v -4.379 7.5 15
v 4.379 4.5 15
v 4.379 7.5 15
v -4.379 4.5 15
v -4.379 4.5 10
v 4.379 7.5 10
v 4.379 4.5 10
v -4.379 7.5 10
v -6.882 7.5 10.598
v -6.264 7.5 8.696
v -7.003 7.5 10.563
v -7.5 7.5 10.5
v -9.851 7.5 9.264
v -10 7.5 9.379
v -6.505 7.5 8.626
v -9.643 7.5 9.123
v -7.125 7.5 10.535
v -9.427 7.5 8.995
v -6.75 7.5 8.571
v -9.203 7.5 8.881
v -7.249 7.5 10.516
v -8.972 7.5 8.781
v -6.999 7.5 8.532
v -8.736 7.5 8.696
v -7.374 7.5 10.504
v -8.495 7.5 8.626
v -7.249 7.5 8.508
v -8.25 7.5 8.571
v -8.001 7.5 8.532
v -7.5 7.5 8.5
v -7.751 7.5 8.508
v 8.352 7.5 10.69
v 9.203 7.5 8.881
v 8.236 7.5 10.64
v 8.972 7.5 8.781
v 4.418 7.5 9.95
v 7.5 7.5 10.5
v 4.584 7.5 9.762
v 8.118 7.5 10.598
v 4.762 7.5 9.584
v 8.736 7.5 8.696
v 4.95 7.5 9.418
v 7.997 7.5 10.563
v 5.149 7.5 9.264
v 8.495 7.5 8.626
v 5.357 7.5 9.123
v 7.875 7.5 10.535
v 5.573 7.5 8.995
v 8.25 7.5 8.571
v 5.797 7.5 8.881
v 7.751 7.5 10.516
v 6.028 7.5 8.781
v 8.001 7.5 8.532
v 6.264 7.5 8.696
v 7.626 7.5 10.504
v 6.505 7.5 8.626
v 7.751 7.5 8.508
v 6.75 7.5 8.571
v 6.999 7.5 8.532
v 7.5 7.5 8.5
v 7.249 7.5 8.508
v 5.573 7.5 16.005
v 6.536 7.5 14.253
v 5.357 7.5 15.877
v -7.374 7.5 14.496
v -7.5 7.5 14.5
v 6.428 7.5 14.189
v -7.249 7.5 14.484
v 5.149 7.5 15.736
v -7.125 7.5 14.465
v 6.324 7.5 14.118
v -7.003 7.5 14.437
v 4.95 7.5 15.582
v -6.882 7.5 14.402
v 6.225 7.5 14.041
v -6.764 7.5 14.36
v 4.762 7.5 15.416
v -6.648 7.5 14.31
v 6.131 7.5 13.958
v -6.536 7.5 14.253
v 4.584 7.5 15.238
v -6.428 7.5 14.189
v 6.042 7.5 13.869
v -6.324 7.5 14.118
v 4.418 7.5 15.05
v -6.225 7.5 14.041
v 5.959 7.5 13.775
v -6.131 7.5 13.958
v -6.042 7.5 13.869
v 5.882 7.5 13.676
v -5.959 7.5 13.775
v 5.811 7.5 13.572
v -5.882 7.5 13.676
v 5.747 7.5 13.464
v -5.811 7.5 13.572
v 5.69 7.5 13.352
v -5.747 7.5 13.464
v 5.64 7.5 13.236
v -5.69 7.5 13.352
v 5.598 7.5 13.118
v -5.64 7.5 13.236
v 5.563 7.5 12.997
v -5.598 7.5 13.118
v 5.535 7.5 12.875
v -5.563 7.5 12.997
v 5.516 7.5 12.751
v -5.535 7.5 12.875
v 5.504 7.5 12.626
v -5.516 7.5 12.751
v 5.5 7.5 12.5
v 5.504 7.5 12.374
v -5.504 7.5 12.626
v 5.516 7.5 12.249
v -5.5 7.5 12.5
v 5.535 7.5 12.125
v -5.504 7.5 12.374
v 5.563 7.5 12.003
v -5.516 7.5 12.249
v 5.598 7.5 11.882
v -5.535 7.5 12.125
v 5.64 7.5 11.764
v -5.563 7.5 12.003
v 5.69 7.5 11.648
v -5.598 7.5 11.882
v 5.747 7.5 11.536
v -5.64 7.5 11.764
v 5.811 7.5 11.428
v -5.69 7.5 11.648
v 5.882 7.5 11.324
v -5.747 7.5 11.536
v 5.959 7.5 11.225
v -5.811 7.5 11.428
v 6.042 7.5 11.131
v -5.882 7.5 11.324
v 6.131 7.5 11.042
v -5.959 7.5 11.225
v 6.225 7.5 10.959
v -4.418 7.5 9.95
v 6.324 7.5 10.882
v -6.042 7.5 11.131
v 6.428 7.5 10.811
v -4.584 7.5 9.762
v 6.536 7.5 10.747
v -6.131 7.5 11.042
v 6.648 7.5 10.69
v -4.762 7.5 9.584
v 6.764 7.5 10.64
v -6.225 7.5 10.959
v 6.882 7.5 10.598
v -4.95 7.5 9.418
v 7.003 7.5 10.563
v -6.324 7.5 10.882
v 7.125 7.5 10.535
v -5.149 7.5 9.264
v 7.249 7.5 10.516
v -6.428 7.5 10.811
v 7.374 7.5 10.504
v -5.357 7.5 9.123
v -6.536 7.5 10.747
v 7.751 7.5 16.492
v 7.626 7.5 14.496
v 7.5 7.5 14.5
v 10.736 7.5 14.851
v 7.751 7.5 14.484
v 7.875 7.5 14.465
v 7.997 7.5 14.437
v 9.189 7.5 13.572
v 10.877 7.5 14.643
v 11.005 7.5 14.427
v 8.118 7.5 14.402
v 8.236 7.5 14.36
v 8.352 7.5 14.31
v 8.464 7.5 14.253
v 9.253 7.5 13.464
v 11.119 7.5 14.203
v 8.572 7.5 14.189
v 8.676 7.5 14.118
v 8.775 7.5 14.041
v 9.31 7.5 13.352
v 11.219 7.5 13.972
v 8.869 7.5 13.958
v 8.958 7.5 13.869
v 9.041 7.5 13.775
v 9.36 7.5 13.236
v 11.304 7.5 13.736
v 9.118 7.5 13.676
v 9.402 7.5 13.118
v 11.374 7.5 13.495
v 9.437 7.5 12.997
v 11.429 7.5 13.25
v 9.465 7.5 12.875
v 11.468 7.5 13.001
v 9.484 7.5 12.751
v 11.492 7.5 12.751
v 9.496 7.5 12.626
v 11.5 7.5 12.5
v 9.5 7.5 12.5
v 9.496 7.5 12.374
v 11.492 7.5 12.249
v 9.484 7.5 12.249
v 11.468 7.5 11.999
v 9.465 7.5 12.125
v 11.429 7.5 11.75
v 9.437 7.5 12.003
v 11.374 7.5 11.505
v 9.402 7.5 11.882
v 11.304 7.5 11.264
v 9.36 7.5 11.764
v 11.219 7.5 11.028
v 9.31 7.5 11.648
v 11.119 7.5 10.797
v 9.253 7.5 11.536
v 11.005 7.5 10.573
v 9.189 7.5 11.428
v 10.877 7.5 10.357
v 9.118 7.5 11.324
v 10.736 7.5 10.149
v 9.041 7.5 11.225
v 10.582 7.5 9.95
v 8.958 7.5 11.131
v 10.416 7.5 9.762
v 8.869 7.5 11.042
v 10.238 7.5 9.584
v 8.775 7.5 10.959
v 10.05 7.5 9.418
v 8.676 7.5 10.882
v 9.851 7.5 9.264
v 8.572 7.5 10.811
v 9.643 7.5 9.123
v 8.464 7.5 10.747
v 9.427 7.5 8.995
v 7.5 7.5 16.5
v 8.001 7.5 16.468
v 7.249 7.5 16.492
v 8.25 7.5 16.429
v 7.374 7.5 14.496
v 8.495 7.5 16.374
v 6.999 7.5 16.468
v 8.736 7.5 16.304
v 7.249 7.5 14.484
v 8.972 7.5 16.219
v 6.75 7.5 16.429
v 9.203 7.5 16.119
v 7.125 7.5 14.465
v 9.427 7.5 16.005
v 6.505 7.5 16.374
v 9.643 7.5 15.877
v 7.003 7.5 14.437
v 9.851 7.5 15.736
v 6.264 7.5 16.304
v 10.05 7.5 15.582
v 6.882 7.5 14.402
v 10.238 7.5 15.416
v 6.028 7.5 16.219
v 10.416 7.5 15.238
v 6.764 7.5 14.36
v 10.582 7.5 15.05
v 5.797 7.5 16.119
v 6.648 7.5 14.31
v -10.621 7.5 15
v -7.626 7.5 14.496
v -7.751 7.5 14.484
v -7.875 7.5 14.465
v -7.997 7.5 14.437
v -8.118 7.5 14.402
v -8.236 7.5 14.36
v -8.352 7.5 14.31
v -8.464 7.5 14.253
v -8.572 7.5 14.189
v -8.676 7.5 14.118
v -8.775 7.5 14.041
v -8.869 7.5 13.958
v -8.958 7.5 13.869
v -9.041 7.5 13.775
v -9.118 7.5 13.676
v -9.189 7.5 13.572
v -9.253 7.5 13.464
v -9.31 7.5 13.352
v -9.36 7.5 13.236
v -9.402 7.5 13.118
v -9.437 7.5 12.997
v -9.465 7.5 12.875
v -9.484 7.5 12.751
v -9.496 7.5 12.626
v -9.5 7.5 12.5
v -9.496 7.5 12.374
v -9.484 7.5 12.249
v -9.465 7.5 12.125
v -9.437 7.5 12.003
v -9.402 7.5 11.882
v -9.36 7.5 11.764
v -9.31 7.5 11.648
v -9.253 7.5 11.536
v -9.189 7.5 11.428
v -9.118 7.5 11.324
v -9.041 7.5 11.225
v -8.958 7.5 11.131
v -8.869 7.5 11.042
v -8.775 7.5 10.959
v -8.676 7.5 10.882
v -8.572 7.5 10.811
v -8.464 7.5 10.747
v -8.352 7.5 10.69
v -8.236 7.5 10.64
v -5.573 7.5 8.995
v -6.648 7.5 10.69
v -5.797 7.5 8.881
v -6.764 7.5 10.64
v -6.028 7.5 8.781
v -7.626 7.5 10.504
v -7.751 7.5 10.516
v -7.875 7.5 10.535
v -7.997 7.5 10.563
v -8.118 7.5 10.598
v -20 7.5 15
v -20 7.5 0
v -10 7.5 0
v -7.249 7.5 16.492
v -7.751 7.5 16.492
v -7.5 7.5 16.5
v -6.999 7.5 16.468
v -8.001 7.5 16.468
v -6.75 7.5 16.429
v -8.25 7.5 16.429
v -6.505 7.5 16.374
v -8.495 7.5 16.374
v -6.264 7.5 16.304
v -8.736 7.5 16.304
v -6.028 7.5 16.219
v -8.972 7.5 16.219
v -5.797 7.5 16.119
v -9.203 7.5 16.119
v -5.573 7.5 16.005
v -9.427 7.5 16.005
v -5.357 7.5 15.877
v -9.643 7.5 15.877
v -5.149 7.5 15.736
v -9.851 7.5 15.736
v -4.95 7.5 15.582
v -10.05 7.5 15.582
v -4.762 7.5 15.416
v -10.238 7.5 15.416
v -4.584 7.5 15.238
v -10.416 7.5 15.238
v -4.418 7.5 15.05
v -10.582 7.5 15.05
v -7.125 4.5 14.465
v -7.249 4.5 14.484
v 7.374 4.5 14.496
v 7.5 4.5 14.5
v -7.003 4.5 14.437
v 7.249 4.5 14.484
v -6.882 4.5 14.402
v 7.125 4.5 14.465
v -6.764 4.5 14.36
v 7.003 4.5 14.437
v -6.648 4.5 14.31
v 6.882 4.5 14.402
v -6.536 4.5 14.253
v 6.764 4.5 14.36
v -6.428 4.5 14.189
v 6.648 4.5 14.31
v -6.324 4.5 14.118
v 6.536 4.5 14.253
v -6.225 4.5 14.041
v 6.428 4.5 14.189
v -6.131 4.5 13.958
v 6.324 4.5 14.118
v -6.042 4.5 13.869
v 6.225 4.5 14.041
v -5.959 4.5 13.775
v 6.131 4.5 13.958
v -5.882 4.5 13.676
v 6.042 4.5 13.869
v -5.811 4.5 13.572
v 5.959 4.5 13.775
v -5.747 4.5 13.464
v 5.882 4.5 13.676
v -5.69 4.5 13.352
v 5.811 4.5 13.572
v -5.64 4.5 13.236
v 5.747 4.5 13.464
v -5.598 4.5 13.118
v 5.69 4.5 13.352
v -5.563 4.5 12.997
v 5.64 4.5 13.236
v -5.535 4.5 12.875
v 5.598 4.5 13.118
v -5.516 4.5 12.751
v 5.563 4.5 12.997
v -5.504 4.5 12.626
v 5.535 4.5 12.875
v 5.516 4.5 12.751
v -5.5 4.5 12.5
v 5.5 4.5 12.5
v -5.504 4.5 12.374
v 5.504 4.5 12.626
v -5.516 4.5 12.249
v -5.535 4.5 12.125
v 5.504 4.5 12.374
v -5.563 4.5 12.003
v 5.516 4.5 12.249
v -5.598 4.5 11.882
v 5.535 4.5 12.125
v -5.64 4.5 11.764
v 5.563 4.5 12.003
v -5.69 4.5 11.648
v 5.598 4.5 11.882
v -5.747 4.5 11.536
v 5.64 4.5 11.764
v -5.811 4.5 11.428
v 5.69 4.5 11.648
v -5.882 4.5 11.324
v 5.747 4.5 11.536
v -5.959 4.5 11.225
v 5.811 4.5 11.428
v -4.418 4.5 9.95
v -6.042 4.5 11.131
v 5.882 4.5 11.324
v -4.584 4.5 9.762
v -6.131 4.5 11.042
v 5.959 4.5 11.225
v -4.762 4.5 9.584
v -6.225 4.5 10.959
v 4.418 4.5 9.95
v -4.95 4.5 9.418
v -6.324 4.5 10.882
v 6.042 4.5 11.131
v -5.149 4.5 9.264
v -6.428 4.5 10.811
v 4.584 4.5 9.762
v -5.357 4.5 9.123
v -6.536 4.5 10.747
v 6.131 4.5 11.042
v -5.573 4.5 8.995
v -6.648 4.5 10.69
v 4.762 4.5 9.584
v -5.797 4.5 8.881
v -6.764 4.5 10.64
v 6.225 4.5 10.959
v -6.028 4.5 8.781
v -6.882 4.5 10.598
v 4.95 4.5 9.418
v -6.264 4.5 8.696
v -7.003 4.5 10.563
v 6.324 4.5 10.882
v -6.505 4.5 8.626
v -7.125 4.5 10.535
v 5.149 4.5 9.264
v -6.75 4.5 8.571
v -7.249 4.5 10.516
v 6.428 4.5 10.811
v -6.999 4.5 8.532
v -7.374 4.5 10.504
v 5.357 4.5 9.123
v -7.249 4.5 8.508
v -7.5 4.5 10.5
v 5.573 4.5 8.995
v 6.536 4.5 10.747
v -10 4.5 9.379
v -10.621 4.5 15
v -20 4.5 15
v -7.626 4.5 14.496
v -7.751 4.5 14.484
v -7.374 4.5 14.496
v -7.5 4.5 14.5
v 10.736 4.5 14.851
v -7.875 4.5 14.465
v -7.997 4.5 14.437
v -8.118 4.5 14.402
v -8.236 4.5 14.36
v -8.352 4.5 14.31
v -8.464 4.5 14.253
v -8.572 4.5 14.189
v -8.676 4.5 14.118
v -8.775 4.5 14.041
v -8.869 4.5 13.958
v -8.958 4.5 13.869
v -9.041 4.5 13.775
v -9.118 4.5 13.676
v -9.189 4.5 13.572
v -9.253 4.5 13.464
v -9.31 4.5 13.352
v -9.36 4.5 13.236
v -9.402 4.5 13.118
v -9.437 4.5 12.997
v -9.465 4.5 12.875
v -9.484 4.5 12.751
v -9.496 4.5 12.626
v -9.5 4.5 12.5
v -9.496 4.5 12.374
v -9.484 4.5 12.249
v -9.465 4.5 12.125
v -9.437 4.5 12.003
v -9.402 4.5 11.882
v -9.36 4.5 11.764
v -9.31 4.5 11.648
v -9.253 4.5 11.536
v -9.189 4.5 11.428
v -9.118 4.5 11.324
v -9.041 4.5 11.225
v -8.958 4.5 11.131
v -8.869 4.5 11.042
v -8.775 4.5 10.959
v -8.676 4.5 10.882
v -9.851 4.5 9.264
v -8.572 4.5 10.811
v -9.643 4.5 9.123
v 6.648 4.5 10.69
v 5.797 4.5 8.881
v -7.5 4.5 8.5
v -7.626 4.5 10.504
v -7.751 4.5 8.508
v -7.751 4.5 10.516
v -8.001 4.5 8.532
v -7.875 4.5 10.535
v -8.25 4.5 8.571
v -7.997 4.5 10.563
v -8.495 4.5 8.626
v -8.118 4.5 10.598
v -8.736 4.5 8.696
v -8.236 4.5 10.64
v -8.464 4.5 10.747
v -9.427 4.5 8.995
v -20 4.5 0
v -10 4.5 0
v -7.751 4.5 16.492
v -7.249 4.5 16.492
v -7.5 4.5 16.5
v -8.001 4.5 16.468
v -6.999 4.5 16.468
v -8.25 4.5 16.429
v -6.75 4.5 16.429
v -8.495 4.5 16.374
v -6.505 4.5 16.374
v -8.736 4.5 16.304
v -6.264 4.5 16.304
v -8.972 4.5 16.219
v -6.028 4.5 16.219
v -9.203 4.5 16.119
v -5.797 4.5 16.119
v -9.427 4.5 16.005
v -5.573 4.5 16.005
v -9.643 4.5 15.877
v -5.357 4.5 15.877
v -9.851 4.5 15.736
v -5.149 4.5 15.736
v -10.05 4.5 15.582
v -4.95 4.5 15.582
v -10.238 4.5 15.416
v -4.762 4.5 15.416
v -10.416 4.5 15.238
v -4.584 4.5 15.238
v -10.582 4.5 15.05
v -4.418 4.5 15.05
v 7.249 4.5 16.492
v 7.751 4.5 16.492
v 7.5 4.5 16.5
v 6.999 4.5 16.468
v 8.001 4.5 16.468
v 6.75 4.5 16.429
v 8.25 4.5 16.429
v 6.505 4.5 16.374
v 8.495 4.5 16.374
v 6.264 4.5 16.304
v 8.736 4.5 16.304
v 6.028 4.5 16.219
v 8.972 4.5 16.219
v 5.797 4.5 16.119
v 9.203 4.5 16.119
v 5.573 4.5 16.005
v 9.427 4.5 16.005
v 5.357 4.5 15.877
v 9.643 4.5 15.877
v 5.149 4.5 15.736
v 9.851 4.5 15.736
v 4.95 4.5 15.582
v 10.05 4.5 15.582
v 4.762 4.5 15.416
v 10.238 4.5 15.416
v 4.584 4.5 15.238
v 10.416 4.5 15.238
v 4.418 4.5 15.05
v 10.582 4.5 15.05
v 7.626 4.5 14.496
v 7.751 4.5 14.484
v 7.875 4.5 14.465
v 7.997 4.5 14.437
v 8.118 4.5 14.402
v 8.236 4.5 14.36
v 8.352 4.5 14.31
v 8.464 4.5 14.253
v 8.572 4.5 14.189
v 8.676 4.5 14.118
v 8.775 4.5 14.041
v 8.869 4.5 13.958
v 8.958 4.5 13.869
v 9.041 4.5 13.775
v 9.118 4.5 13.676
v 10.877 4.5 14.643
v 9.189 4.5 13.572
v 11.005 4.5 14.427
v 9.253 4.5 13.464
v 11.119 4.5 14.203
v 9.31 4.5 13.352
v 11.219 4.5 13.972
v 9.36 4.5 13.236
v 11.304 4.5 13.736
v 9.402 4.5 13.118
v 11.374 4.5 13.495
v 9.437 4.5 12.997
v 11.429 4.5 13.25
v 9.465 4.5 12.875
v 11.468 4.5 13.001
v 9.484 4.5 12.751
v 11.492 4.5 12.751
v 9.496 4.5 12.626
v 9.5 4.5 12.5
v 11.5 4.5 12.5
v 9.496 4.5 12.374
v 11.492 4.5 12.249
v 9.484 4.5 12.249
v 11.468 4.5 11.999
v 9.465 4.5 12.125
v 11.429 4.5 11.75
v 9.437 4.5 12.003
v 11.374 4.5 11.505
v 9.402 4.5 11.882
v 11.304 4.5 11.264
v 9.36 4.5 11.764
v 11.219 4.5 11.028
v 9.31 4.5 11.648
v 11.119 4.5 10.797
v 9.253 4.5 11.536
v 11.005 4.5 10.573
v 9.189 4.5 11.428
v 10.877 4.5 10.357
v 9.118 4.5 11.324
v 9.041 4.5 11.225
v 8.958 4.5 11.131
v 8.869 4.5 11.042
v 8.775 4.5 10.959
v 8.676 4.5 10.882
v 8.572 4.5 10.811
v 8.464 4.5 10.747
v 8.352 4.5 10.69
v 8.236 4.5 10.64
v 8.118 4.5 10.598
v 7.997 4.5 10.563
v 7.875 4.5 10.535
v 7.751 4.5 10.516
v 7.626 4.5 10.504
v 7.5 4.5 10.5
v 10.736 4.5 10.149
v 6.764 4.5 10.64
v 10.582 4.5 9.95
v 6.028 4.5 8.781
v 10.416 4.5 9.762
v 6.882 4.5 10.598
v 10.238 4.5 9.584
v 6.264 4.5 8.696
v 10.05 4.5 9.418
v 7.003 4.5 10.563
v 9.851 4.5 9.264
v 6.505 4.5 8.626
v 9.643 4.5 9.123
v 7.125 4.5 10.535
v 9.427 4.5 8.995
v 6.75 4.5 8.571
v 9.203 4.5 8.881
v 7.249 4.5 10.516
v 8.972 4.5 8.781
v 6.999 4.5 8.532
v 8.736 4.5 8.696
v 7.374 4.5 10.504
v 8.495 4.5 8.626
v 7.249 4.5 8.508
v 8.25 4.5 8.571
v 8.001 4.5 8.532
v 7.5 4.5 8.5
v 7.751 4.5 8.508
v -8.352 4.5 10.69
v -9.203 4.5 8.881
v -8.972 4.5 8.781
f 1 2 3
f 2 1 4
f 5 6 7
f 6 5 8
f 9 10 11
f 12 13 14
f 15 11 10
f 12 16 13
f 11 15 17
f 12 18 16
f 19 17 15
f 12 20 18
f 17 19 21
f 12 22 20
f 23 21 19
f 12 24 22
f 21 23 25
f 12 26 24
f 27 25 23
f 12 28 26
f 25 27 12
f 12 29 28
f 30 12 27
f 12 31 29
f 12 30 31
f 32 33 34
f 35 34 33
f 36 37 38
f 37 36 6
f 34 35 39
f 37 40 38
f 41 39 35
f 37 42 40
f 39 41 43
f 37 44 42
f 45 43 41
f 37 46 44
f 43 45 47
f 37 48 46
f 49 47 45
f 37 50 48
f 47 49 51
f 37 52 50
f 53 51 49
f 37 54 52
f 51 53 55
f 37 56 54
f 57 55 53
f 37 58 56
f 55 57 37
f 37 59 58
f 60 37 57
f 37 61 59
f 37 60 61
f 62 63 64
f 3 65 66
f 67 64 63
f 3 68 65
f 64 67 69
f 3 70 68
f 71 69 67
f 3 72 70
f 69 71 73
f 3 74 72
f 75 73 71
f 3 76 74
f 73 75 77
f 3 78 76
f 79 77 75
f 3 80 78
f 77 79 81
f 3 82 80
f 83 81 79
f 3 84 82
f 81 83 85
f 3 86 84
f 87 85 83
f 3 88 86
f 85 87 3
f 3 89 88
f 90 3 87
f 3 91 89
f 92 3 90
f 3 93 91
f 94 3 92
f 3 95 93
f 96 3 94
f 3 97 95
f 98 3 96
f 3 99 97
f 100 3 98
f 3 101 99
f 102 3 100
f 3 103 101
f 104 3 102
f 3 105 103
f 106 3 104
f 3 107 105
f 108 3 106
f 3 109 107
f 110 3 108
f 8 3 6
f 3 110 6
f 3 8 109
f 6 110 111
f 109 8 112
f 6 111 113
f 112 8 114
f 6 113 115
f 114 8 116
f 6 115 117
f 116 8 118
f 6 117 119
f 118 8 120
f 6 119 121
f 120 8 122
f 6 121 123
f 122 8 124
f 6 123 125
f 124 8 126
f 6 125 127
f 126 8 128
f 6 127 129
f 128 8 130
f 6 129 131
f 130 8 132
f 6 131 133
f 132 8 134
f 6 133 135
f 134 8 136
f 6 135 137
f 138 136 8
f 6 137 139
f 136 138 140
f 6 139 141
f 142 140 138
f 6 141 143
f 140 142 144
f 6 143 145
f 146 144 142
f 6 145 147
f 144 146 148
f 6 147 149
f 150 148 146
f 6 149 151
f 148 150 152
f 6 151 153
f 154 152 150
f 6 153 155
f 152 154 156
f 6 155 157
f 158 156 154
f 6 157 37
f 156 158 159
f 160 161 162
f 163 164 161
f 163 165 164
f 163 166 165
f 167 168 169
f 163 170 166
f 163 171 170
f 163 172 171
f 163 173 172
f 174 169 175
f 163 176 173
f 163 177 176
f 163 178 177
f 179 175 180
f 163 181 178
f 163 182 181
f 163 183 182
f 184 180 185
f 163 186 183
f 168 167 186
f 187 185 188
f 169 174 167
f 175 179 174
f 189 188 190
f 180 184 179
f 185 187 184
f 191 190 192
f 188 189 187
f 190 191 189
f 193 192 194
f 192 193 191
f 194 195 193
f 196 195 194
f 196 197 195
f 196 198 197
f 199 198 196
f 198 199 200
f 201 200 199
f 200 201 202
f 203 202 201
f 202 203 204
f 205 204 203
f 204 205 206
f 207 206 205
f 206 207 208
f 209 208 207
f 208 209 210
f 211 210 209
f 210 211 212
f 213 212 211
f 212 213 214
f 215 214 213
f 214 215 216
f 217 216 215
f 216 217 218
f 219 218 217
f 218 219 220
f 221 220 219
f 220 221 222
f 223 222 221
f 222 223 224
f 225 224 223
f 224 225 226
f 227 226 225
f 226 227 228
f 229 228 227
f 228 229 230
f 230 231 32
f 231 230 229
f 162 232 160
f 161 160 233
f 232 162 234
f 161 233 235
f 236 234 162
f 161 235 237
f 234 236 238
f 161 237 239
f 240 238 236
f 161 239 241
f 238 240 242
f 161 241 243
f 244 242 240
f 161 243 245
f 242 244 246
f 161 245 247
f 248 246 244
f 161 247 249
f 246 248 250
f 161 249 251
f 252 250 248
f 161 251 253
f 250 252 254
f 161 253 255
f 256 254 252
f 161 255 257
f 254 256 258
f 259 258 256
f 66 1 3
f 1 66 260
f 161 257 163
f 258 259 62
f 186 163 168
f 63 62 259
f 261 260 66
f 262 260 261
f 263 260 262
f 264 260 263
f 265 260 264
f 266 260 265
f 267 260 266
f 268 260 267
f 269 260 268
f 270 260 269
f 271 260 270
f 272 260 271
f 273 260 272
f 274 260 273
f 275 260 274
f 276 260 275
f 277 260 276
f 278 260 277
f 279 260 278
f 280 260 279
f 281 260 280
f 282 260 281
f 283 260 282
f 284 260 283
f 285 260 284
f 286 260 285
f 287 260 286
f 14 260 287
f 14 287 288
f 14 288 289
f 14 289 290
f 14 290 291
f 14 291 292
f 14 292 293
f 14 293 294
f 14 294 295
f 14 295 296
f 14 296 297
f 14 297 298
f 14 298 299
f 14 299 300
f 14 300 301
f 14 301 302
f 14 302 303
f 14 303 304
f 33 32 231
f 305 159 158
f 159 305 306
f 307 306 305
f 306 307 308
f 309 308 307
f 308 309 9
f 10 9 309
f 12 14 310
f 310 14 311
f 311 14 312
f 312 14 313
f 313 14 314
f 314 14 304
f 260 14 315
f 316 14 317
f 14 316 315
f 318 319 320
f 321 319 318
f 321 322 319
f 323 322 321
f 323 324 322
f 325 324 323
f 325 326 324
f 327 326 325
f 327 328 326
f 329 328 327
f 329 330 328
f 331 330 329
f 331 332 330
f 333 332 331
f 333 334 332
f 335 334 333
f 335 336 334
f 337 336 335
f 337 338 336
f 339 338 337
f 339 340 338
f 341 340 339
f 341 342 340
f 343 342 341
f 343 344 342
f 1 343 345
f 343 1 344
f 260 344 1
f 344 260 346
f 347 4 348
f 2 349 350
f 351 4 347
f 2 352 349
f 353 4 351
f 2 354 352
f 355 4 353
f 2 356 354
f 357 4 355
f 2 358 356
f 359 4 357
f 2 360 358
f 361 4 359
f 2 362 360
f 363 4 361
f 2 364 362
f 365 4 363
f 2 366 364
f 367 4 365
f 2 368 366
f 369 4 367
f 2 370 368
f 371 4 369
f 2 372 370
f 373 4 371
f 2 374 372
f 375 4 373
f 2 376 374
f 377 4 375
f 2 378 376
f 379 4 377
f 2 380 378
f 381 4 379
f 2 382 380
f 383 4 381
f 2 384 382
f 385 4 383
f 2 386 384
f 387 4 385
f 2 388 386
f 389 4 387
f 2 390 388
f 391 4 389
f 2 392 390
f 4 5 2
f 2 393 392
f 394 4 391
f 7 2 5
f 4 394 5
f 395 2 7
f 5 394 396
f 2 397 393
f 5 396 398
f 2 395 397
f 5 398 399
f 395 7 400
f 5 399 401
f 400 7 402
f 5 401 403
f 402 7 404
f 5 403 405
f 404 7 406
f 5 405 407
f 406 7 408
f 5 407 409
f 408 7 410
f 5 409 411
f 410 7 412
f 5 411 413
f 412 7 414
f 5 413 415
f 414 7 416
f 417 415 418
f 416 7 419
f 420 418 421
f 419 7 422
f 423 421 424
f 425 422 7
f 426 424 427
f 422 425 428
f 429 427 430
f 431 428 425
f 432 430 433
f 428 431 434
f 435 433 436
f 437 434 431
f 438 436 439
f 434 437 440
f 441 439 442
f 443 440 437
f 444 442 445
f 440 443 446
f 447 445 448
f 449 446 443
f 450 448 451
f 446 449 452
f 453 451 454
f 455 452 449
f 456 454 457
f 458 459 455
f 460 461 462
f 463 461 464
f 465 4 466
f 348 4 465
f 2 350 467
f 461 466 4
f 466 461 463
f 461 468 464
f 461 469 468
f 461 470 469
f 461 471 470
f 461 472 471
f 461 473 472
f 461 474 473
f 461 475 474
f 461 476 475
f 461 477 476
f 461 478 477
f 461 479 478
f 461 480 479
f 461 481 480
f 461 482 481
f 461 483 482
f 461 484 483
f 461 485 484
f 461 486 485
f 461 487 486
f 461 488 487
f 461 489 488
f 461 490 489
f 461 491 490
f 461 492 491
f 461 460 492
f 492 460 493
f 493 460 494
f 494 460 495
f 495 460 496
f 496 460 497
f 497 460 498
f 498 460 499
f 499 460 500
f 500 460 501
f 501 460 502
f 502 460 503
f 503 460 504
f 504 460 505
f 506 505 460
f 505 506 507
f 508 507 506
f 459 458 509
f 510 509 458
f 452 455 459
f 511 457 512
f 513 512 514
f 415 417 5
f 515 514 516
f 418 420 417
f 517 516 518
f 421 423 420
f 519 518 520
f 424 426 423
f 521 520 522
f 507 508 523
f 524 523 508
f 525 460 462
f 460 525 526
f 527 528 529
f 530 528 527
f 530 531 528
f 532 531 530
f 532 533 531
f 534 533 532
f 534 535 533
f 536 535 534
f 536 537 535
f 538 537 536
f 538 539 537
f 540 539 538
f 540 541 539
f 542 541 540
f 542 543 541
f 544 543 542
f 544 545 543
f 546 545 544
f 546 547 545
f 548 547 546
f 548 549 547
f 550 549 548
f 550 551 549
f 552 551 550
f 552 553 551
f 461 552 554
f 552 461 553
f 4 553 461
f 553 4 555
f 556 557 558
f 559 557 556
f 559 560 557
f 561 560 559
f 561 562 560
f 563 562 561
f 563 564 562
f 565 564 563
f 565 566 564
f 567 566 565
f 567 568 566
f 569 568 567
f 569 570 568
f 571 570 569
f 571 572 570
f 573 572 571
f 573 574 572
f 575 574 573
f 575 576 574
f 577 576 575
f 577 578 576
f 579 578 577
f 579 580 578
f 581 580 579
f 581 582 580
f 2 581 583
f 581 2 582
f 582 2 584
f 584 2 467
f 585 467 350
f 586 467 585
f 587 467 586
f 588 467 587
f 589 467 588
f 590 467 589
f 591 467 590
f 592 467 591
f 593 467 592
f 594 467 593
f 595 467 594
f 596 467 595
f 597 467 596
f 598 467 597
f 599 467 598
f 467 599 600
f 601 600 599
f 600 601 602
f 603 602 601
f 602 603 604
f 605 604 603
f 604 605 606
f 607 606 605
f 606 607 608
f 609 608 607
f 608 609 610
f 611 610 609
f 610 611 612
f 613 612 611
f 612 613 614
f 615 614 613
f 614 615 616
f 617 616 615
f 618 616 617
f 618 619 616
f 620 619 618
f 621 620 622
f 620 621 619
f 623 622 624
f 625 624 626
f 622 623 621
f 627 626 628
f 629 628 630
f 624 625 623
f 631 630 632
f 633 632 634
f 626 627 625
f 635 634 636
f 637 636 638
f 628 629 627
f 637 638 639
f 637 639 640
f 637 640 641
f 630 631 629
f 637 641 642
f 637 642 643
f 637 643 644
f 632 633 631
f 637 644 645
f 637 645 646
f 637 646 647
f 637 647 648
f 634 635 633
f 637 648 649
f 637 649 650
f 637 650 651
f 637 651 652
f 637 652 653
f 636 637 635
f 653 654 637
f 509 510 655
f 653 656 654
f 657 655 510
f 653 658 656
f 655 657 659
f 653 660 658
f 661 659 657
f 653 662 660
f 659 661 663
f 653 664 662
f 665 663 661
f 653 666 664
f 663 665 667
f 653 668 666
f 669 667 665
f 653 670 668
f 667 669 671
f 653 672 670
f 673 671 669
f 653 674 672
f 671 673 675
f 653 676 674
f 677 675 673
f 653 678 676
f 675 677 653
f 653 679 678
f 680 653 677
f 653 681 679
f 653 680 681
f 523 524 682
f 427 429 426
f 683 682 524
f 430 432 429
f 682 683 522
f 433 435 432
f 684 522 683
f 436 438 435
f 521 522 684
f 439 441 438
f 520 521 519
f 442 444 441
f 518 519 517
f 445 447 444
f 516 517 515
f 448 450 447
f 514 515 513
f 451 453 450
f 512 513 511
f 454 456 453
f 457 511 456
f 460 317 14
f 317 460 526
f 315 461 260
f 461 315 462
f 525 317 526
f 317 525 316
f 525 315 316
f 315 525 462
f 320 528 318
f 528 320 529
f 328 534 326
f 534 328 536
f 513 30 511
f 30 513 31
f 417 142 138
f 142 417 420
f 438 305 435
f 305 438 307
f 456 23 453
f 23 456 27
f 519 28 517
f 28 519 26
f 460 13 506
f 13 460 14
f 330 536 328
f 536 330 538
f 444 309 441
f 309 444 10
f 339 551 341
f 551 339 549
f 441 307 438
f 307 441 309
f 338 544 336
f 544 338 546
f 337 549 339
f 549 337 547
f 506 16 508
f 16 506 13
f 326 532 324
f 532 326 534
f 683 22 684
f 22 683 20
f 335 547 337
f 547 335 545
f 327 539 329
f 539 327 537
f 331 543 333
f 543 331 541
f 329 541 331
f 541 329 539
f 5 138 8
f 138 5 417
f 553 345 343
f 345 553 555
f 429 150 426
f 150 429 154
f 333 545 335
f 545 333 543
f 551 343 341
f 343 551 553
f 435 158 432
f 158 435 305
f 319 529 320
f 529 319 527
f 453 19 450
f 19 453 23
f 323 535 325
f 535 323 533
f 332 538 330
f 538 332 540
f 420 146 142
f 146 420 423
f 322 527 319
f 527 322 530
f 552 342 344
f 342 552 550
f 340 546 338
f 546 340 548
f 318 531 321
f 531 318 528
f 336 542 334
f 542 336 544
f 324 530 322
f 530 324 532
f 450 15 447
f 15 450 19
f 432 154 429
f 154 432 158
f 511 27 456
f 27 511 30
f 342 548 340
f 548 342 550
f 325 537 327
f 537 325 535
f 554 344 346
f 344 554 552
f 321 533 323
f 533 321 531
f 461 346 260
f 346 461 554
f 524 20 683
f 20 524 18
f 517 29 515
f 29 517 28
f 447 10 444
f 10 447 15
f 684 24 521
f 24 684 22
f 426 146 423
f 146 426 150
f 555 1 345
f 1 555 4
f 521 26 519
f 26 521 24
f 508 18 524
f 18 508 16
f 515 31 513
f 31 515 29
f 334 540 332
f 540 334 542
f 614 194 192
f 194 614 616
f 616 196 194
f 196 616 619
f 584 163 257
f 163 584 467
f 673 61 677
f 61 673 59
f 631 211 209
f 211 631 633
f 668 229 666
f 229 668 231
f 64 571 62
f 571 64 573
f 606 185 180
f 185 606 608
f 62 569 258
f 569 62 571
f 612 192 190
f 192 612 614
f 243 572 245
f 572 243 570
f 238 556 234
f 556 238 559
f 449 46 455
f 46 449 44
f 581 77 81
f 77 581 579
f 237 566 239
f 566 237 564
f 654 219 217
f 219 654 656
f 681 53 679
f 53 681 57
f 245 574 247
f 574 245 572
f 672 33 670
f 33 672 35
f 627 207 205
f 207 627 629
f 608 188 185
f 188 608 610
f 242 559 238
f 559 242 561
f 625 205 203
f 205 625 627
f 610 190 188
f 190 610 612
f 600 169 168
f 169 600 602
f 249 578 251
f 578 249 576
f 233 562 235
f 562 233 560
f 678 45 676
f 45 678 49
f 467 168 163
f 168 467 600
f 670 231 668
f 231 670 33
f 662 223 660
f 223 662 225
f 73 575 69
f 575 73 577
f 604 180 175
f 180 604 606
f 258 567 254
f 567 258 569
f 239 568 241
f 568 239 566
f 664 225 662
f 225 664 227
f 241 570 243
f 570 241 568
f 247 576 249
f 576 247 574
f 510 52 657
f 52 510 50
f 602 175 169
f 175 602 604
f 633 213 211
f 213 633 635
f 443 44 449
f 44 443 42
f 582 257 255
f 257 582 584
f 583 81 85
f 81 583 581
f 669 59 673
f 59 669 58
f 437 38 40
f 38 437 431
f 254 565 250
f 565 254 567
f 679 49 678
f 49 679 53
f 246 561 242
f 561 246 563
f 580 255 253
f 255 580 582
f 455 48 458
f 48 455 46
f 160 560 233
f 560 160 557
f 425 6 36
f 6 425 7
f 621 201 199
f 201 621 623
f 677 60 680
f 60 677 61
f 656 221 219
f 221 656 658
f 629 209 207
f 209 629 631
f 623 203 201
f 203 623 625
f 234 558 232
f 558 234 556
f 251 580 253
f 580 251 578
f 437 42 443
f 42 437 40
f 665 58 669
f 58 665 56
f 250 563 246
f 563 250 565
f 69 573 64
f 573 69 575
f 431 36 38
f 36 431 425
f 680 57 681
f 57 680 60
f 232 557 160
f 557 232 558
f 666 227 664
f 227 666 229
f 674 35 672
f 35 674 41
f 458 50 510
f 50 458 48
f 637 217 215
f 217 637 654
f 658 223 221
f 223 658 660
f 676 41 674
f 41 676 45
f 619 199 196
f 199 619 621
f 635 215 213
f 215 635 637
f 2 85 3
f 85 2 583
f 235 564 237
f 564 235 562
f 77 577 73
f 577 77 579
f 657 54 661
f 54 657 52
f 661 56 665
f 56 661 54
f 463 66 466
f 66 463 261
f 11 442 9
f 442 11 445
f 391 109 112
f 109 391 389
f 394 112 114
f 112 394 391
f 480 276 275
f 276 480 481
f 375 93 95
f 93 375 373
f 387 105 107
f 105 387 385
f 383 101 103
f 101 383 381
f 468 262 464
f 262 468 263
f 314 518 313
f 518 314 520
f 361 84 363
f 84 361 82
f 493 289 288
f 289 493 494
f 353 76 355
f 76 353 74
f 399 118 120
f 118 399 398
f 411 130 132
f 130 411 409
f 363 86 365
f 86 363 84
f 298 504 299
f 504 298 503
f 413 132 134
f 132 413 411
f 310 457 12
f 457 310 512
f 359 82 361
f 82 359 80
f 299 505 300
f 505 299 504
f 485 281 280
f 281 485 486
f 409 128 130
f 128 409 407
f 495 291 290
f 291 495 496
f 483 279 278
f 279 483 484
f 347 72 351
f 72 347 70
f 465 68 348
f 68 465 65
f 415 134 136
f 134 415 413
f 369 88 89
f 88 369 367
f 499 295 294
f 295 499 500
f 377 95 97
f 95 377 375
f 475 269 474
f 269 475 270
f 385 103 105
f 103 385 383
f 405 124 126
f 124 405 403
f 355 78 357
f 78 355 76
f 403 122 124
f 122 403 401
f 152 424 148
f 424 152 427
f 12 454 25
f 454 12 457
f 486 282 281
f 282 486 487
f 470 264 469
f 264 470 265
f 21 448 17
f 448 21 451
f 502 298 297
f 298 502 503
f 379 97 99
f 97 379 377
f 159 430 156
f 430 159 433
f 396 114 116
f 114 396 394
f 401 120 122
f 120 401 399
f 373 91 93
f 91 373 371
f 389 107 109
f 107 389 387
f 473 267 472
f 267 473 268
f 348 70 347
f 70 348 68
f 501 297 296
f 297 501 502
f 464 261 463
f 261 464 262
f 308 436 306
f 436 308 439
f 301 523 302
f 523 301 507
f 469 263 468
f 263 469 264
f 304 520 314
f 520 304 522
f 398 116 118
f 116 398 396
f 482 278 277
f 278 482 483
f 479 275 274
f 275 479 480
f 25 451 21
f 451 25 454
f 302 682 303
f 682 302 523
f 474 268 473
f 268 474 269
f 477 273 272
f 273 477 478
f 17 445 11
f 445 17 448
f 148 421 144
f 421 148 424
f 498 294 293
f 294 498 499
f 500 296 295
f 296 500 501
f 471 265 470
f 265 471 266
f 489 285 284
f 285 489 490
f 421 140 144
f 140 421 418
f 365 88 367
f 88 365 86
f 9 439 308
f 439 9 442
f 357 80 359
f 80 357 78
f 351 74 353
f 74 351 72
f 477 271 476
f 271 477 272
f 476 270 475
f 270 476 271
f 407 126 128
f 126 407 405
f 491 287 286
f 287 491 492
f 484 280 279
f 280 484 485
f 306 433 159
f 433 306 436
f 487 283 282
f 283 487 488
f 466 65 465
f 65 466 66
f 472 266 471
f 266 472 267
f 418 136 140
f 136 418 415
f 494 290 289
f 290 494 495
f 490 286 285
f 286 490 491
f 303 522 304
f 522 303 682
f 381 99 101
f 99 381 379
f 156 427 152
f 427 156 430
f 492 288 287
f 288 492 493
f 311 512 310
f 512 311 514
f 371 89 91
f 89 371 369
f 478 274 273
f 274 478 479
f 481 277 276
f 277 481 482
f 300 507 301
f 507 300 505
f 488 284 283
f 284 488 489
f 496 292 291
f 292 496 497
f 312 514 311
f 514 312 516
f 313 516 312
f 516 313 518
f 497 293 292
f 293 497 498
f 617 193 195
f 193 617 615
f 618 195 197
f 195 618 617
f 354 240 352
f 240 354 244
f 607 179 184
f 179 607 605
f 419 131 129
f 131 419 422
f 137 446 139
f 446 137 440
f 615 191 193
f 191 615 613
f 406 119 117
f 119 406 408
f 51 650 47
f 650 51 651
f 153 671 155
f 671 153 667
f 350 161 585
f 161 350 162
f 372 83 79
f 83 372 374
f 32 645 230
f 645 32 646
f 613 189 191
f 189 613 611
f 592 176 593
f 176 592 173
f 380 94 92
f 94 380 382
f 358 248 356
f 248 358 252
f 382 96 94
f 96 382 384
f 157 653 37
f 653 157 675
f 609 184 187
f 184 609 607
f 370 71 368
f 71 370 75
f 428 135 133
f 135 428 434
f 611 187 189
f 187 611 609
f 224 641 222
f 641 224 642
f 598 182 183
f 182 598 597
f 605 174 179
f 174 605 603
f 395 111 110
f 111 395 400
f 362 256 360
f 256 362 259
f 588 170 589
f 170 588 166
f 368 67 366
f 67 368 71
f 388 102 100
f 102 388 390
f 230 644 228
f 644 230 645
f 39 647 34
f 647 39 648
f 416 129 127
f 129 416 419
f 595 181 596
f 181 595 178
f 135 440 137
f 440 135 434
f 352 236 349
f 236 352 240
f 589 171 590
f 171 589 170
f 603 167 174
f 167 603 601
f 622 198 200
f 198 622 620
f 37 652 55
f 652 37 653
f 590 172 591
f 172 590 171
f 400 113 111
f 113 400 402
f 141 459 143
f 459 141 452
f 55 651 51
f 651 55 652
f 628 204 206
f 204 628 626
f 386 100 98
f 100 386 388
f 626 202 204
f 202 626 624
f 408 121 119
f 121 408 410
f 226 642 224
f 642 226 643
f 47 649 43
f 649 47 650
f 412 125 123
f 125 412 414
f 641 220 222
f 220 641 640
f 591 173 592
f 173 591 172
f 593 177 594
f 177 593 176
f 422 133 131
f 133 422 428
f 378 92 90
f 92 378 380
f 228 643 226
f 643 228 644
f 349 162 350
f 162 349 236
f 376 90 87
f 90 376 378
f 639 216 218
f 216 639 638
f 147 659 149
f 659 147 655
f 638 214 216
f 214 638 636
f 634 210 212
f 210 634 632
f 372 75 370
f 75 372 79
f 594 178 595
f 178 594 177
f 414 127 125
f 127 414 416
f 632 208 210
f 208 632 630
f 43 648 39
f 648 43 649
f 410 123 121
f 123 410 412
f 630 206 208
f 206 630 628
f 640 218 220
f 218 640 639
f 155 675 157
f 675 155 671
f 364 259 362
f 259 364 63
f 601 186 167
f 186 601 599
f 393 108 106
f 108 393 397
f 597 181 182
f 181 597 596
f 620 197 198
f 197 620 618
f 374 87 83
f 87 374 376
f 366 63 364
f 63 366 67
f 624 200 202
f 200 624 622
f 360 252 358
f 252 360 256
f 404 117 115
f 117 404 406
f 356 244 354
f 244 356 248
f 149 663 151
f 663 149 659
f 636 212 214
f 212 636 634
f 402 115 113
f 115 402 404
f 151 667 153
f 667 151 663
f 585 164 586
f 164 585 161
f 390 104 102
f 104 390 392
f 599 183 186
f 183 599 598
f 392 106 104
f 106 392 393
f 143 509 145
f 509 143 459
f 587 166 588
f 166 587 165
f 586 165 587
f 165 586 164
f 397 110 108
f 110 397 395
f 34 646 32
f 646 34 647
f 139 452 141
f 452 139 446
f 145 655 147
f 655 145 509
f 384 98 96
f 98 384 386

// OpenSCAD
difference(){
	union(){
        
        translate([-8,4.5,10]){
            cube([15,3,5], center=false);
        }         
        translate([-20,4.5,0]){
            cube([10,3,15], center=false);
        }         


        translate([-7.5,7.5,12.5]){
            rotate([90,0,0]){
                cylinder(h=3, r=4, $fn=100, center=false);
            }
        }         
        translate([7.5,7.5,12.5]){
            rotate([90,0,0]){
                cylinder(h=3, r=4, $fn=100, center=false);
            }
        }         

	}
	union() {

        translate([-7.5,8.5,12.5]){
            rotate([90,0,0]){
                cylinder(h=25, r=2, $fn=100, center=false);
            }
        }         
        translate([7.5,8.5,12.5]){
            rotate([90,0,0]){
                cylinder(h=25, r=2, $fn=100, center=false);
            }
        }             

     

	}
}
